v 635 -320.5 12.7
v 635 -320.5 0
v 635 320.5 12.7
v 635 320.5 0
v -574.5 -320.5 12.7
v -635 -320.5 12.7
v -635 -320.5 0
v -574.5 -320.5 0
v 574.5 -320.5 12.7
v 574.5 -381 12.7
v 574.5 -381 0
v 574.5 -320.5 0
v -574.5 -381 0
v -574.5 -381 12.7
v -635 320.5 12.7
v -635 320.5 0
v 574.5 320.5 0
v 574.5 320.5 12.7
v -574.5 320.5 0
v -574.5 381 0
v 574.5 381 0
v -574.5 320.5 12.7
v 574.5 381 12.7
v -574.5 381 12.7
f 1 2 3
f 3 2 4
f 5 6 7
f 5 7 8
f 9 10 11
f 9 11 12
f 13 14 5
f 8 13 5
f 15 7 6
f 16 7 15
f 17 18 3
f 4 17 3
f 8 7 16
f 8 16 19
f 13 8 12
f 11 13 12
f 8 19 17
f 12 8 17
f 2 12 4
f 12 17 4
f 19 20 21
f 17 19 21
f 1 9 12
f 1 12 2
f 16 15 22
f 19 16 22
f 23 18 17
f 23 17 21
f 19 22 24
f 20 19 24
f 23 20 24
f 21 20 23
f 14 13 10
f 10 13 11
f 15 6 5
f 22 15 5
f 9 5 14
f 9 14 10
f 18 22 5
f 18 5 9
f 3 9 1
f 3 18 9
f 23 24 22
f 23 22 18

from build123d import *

# Parameters (mm, degrees)
SKETCH1_W           = 1270
SKETCH1_H           = 762
BOSS_EXTRUDE1_DEPTH = 12.7
SKETCH2_W           = 60.5
SKETCH2_H           = 60.5
CUT_EXTRUDE1_DEPTH  = 741.639784241


with BuildPart() as part:
    # Sketch1 → Boss-Extrude1 (new body)
    with BuildSketch(Plane.XY):
        Rectangle(SKETCH1_W, SKETCH1_H)
    extrude(amount=BOSS_EXTRUDE1_DEPTH)

    # Sketch2 → Cut-Extrude1 (cut, through all)
    with BuildSketch(Plane.XY.offset(12.7)):
        with Locations((-604.75, 350.75)):
            Rectangle(SKETCH2_W, SKETCH2_H)
        with Locations((604.75, 350.75)):
            Rectangle(SKETCH2_W, SKETCH2_H)
        with Locations((604.75, -350.75)):
            Rectangle(SKETCH2_W, SKETCH2_H)
        with Locations((-604.75, -350.75)):
            Rectangle(SKETCH2_W, SKETCH2_H)
    extrude(amount=-CUT_EXTRUDE1_DEPTH, mode=Mode.SUBTRACT)


solid = part.part
